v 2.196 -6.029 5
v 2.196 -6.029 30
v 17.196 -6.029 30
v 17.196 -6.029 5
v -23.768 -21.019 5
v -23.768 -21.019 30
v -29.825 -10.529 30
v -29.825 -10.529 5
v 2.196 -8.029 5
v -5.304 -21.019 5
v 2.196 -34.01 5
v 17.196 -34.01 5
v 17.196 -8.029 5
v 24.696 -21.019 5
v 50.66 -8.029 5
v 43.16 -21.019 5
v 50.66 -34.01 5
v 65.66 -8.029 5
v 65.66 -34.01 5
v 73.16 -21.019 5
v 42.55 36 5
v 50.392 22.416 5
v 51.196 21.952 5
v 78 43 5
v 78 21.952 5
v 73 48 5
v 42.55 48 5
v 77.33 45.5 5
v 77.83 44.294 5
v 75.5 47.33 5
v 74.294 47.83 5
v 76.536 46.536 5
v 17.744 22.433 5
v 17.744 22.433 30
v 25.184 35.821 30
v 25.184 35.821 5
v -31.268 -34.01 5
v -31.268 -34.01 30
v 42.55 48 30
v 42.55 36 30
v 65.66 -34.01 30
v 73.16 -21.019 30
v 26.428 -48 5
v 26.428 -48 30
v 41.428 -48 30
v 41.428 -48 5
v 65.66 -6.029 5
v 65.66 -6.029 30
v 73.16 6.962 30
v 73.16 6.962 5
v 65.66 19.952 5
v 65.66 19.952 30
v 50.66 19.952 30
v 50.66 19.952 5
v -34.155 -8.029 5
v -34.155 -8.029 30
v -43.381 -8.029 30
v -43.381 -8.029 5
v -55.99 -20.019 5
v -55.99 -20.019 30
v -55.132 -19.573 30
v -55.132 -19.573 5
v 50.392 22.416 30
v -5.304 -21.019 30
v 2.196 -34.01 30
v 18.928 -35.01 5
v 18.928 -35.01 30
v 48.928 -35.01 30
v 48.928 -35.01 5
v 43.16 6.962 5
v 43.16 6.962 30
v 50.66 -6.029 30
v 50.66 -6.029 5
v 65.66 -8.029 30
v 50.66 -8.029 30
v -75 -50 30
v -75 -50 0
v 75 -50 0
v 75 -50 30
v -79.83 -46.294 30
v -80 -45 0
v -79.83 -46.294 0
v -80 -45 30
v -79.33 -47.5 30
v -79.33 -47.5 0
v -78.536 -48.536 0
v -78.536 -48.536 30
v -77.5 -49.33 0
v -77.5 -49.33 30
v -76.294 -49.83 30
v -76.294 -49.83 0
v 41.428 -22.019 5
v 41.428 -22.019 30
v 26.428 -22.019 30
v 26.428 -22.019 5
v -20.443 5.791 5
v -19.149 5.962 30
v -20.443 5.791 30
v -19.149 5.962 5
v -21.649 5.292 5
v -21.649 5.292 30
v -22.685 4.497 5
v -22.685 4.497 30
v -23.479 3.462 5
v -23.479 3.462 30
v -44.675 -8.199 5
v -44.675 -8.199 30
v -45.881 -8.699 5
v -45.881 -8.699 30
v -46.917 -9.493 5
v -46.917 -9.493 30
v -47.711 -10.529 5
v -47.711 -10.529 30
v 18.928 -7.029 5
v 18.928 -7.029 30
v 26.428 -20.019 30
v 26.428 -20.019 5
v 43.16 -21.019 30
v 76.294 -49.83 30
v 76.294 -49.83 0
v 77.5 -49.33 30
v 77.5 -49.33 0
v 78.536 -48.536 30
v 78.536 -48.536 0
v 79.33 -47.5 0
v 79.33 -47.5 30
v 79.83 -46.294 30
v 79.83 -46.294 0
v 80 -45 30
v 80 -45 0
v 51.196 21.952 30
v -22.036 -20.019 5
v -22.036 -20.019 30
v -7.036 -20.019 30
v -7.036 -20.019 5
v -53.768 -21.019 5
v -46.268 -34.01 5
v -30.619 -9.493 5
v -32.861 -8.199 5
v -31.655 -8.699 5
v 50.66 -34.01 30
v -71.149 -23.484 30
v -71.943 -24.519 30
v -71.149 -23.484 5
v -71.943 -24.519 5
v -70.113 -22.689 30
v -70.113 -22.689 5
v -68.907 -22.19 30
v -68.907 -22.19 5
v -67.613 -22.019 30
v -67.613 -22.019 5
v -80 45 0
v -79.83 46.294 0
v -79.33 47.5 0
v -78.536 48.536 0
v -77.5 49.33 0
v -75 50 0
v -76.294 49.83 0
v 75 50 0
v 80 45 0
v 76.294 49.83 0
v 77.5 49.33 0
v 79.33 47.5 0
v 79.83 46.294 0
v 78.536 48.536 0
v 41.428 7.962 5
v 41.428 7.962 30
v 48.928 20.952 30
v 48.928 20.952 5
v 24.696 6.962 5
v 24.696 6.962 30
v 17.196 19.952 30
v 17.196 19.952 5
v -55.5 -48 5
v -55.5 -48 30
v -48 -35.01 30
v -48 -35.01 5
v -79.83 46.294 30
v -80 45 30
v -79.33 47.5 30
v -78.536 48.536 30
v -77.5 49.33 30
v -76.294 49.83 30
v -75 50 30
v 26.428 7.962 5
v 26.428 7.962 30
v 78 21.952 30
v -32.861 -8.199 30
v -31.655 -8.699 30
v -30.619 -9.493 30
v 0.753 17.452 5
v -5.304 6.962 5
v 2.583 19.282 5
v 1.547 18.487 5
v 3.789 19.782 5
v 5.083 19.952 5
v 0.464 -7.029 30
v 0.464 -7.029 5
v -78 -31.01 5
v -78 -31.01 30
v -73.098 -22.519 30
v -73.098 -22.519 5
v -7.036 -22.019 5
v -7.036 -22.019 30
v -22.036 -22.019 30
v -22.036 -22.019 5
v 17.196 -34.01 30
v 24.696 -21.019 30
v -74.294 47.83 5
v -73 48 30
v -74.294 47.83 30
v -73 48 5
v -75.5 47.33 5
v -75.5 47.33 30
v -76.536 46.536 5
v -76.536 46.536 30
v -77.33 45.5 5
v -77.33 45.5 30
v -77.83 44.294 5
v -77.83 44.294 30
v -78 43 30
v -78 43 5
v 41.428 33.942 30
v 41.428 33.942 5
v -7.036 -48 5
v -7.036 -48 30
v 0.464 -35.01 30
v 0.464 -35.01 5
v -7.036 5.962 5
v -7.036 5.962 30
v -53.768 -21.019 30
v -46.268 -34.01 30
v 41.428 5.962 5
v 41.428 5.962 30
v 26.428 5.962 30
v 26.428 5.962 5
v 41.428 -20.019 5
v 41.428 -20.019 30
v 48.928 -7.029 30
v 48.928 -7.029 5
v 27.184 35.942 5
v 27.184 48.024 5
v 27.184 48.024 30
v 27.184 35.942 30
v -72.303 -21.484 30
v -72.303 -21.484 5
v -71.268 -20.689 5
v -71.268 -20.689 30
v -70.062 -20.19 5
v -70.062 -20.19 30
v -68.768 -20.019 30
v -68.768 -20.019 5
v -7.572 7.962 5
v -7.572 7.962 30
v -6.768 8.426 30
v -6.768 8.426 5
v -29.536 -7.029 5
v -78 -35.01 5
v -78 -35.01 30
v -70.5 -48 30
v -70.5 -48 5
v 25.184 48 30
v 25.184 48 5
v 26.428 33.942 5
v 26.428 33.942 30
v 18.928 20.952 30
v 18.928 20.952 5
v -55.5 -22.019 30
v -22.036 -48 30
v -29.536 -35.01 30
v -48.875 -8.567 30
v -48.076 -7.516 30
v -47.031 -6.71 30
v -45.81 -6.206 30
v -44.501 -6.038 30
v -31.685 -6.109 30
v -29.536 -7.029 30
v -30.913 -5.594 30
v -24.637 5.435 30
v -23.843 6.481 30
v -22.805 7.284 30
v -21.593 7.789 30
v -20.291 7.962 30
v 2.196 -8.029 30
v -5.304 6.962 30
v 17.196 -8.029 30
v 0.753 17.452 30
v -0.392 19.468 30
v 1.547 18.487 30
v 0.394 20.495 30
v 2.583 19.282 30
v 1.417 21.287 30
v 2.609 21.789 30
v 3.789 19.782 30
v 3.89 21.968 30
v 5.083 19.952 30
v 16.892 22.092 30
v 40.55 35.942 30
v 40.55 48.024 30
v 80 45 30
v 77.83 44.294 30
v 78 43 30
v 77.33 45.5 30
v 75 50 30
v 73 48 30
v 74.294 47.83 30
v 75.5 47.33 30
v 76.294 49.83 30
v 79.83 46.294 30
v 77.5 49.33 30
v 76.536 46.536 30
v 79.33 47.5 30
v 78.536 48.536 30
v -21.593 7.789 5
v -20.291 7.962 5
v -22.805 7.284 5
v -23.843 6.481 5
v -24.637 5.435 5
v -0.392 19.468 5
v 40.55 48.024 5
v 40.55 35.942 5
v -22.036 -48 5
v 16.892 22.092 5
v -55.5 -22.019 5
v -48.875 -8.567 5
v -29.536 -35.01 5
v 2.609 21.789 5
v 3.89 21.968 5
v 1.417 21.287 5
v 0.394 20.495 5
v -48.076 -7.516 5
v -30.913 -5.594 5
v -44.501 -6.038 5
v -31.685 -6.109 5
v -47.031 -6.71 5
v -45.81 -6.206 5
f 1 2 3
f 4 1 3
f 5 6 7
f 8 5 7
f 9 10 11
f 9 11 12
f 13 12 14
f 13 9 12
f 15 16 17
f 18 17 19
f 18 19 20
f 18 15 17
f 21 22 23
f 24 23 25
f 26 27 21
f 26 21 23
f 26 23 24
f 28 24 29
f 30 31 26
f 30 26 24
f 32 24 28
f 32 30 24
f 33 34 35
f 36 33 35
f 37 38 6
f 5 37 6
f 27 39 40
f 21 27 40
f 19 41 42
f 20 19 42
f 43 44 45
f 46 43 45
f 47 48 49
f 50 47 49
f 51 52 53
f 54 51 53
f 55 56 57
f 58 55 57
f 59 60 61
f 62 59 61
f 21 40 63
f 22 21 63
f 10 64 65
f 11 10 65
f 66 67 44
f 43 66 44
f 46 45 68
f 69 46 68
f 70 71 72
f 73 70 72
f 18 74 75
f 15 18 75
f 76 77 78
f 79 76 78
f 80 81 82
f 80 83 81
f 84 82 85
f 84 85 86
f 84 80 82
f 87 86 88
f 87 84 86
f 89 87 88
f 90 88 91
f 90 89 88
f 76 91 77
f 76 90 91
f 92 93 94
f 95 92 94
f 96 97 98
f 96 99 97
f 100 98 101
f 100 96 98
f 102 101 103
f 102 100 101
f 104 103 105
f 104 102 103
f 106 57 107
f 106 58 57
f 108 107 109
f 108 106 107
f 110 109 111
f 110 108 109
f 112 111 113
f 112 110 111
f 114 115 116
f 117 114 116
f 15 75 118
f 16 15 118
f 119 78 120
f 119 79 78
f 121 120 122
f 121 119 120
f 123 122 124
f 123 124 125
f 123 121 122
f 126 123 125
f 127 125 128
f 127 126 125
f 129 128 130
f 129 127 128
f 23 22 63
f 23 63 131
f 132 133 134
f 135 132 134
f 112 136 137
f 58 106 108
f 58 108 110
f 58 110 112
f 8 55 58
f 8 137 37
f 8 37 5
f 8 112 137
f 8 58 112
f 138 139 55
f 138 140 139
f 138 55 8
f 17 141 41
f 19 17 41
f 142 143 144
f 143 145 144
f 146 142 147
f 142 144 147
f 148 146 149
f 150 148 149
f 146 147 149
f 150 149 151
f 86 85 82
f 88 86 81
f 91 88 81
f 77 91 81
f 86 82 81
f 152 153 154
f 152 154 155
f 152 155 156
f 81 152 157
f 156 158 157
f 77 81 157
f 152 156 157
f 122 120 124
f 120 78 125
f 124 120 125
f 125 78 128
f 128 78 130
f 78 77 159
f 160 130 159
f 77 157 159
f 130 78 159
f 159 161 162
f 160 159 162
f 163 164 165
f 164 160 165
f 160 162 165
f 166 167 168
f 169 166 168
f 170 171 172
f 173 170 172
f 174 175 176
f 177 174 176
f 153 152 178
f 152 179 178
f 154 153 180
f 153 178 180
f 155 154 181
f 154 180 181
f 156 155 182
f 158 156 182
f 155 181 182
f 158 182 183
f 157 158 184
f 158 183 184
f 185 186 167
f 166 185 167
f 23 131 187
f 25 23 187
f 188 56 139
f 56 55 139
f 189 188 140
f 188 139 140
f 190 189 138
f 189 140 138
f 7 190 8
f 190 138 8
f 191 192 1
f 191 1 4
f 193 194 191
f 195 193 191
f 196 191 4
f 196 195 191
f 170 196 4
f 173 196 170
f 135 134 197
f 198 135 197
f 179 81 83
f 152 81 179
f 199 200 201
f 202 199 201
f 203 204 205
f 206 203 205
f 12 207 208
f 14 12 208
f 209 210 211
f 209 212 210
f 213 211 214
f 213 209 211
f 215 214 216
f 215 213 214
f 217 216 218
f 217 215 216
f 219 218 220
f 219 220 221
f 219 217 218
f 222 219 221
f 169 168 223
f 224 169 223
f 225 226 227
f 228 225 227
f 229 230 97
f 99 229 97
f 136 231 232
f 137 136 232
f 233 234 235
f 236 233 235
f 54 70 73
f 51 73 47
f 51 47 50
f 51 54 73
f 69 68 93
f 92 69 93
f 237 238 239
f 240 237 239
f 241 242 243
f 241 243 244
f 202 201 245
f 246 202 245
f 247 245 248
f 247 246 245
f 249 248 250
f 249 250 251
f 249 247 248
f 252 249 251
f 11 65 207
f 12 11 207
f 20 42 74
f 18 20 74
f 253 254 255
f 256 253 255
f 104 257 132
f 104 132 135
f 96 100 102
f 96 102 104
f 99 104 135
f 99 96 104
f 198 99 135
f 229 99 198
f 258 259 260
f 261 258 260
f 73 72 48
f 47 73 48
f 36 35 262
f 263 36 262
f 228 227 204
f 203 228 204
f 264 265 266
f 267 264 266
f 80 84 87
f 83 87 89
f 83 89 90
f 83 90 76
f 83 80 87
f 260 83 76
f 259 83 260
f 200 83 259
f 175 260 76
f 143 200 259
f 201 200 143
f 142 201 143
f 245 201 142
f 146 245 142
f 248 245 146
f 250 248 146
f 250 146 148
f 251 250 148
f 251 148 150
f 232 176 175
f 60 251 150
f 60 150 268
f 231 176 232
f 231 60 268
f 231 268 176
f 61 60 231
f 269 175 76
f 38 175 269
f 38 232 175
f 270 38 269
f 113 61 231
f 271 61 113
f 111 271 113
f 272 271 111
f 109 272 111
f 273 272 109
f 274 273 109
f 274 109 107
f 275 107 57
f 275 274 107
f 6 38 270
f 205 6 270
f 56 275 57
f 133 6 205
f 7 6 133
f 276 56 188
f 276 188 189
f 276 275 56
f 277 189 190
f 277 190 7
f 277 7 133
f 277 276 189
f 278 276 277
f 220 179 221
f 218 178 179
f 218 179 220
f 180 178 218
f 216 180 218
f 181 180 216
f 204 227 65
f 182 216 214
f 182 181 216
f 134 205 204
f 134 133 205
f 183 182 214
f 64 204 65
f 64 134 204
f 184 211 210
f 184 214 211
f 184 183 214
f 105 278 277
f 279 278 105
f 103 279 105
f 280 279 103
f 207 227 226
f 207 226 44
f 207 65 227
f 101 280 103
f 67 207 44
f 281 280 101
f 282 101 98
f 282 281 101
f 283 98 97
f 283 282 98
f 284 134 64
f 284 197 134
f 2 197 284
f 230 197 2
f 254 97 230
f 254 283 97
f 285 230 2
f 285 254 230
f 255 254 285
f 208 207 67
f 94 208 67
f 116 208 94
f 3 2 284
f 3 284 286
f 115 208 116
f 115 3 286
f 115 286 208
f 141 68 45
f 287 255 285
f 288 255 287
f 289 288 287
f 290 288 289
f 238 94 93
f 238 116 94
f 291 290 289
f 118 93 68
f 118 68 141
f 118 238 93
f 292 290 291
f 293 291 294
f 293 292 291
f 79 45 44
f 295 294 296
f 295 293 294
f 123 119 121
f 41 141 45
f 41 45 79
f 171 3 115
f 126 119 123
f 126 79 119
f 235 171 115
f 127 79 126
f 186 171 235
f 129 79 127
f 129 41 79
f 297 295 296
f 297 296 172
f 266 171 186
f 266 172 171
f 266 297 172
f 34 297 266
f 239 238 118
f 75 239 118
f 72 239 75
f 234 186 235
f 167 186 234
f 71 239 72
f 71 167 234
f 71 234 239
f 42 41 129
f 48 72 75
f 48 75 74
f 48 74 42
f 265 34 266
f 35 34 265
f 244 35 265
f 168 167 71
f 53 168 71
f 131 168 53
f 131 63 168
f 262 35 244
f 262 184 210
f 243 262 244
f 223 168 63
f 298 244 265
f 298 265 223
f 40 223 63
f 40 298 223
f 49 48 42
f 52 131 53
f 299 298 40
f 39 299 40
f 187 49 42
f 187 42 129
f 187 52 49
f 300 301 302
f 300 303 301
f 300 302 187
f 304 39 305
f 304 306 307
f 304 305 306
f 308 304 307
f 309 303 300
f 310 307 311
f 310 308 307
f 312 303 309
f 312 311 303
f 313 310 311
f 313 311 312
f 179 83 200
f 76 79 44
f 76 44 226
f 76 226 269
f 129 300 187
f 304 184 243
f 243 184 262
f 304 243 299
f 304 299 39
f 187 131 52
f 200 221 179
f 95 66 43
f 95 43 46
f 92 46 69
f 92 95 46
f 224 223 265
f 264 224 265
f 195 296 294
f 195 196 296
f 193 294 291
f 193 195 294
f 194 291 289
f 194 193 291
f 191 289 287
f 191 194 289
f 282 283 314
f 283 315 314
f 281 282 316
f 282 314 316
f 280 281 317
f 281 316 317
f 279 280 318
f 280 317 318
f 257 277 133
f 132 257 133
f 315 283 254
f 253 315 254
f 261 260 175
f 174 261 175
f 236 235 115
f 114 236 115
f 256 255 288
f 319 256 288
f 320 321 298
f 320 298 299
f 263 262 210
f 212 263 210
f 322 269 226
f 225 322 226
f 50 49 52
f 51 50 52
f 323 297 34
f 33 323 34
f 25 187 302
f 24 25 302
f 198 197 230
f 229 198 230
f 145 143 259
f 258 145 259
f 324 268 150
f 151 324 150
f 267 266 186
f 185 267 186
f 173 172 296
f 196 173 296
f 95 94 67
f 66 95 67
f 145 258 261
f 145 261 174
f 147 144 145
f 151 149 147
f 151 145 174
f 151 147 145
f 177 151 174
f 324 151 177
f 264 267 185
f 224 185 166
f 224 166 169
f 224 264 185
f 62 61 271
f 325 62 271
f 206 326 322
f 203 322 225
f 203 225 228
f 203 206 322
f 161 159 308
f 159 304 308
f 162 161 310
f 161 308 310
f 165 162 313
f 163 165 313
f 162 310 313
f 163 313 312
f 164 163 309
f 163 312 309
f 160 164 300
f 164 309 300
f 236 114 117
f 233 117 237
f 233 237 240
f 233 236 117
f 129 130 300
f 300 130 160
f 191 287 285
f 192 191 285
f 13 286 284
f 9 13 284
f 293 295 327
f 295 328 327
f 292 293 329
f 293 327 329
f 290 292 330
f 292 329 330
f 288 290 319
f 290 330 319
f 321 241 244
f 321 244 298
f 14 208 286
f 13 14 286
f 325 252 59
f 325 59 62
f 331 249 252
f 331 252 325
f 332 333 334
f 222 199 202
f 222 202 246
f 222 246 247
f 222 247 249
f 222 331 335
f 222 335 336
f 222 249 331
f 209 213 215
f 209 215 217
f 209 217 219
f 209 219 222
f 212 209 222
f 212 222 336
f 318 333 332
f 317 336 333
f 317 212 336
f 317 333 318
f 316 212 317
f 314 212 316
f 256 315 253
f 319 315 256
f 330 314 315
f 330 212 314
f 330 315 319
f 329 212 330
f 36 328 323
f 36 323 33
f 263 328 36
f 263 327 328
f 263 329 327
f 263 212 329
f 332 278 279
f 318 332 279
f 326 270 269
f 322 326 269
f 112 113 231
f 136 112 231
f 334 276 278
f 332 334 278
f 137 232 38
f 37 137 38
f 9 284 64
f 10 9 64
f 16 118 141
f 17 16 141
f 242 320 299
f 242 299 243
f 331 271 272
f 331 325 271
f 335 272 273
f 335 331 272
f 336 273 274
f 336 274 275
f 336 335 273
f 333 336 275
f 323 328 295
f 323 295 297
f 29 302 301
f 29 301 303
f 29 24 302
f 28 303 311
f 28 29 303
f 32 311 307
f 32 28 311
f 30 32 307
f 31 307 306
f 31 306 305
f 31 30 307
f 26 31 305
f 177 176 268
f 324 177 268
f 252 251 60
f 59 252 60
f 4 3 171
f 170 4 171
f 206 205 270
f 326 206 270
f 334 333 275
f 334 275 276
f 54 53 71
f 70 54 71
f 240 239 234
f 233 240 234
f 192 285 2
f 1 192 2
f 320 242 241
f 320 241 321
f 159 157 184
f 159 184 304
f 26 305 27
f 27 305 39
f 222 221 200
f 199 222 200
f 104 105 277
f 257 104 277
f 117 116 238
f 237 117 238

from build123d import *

# Parameters (mm, degrees)
F0_W     = 160
F0_H     = 100
F1_DEPTH = 30
F3_DEPTH = 25
F5_DEPTH = 25
F6_R     = 5
F7_R     = 5
F8_R     = 5


with BuildPart() as f1:
    # F0 (on Top) → F1 (new body)
    with BuildSketch(Plane.XY):
        Rectangle(F0_W, F0_H)
    extrude(amount=F1_DEPTH)

    # F2 (on face) → F3 (cut)
    with BuildSketch(Plane.XY.offset(30)):
        Polygon((-70.5, -48), (-55.5, -48), (-48, -35.009619), (-55.5, -22.019238), (-70.5, -22.019238), (-78, -35.009619), align=None)
        Polygon((-31.267949, -8.028857), (-46.267949, -8.028857), (-53.767949, -21.019238), (-46.267949, -34.009619), (-31.267949, -34.009619), (-23.767949, -21.019238), align=None)
        Polygon((-7.035898, 5.961524), (-22.035898, 5.961524), (-29.535898, -7.028857), (-22.035898, -20.019238), (-7.035898, -20.019238), (0.464102, -7.028857), align=None)
        Polygon((17.196152, 19.951905), (2.196152, 19.951905), (-5.303848, 6.961524), (2.196152, -6.028857), (17.196152, -6.028857), (24.696152, 6.961524), align=None)
        Polygon((41.428203, 33.942286), (26.428203, 33.942286), (18.928203, 20.951905), (26.428203, 7.961524), (41.428203, 7.961524), (48.928203, 20.951905), align=None)
        Polygon((-7.035898, -22.019238), (-22.035898, -22.019238), (-29.535898, -35.009619), (-22.035898, -48), (-7.035898, -48), (0.464102, -35.009619), align=None)
        Polygon((17.196152, -8.028857), (2.196152, -8.028857), (-5.303848, -21.019238), (2.196152, -34.009619), (17.196152, -34.009619), (24.696152, -21.019238), align=None)
        Polygon((41.428203, 5.961524), (26.428203, 5.961524), (18.928203, -7.028857), (26.428203, -20.019238), (41.428203, -20.019238), (48.928203, -7.028857), align=None)
        Polygon((65.660254, 19.951905), (50.660254, 19.951905), (43.160254, 6.961524), (50.660254, -6.028857), (65.660254, -6.028857), (73.160254, 6.961524), align=None)
        Polygon((41.428203, -22.019238), (26.428203, -22.019238), (18.928203, -35.009619), (26.428203, -48), (41.428203, -48), (48.928203, -35.009619), align=None)
        Polygon((65.660254, -8.028857), (50.660254, -8.028857), (43.160254, -21.019238), (50.660254, -34.009619), (65.660254, -34.009619), (73.160254, -21.019238), align=None)
    extrude(amount=-F3_DEPTH, mode=Mode.SUBTRACT)

    # F4 (on face) → F5 (cut, through all)
    with BuildSketch(Plane.XY.offset(30)):
        Polygon((51.196152, 21.951905), (78, 21.951905), (78, 48), (42.549597, 48), (42.549597, 35.999976), (50.392305, 22.416007), align=None)
        Polygon((16.891695, 22.092275), (17.743567, 22.433024), (25.18436, 35.821269), (25.18436, 48), (-78, 48), (-78, -31.009619), (-71.654701, -20.019238), (-55.989621, -20.019238), (-55.132385, -19.572759), (-47.427833, -6.022478), (-31.684874, -6.108645), (-30.913347, -5.594294), (-23.198907, 7.961524), (-7.571797, 7.961524), (-6.767949, 8.425626), (1.035106, 21.940913), align=None)
        Polygon((40.549597, 48.023537), (27.18436, 48.023537), (27.18436, 35.942286), (33.928203, 35.942286), (40.549597, 35.942286), align=None)
    extrude(amount=-F5_DEPTH, mode=Mode.SUBTRACT)

    # F6
    f6_edges = [f1.edges().sort_by_distance(p)[0] for p in [
        (-46.267949, -8.028857, 17.5),
        (-31.267949, -8.028857, 17.5),
    ]]
    fillet(f6_edges, radius=F6_R)

    # F7
    f7_edges = [f1.edges().sort_by_distance(p)[0] for p in [
        (-80, -50, 15),
        (80, -50, 15),
        (80, 50, 15),
        (-80, 50, 15),
        (-78, 48, 17.5),
        (78, 48, 17.5),
    ]]
    fillet(f7_edges, radius=F7_R)

    # F8
    f8_edges = [f1.edges().sort_by_distance(p)[0] for p in [
        (-23.198907, 7.961524, 17.5),
        (1.035106, 21.940913, 17.5),
        (-47.427833, -6.022478, 17.5),
        (-71.654701, -20.019238, 17.5),
        (-70.5, -22.019238, 17.5),
        (-22.035898, 5.961524, 17.5),
        (2.196152, 19.951905, 17.5),
    ]]
    fillet(f8_edges, radius=F8_R)


solid = f1.part
